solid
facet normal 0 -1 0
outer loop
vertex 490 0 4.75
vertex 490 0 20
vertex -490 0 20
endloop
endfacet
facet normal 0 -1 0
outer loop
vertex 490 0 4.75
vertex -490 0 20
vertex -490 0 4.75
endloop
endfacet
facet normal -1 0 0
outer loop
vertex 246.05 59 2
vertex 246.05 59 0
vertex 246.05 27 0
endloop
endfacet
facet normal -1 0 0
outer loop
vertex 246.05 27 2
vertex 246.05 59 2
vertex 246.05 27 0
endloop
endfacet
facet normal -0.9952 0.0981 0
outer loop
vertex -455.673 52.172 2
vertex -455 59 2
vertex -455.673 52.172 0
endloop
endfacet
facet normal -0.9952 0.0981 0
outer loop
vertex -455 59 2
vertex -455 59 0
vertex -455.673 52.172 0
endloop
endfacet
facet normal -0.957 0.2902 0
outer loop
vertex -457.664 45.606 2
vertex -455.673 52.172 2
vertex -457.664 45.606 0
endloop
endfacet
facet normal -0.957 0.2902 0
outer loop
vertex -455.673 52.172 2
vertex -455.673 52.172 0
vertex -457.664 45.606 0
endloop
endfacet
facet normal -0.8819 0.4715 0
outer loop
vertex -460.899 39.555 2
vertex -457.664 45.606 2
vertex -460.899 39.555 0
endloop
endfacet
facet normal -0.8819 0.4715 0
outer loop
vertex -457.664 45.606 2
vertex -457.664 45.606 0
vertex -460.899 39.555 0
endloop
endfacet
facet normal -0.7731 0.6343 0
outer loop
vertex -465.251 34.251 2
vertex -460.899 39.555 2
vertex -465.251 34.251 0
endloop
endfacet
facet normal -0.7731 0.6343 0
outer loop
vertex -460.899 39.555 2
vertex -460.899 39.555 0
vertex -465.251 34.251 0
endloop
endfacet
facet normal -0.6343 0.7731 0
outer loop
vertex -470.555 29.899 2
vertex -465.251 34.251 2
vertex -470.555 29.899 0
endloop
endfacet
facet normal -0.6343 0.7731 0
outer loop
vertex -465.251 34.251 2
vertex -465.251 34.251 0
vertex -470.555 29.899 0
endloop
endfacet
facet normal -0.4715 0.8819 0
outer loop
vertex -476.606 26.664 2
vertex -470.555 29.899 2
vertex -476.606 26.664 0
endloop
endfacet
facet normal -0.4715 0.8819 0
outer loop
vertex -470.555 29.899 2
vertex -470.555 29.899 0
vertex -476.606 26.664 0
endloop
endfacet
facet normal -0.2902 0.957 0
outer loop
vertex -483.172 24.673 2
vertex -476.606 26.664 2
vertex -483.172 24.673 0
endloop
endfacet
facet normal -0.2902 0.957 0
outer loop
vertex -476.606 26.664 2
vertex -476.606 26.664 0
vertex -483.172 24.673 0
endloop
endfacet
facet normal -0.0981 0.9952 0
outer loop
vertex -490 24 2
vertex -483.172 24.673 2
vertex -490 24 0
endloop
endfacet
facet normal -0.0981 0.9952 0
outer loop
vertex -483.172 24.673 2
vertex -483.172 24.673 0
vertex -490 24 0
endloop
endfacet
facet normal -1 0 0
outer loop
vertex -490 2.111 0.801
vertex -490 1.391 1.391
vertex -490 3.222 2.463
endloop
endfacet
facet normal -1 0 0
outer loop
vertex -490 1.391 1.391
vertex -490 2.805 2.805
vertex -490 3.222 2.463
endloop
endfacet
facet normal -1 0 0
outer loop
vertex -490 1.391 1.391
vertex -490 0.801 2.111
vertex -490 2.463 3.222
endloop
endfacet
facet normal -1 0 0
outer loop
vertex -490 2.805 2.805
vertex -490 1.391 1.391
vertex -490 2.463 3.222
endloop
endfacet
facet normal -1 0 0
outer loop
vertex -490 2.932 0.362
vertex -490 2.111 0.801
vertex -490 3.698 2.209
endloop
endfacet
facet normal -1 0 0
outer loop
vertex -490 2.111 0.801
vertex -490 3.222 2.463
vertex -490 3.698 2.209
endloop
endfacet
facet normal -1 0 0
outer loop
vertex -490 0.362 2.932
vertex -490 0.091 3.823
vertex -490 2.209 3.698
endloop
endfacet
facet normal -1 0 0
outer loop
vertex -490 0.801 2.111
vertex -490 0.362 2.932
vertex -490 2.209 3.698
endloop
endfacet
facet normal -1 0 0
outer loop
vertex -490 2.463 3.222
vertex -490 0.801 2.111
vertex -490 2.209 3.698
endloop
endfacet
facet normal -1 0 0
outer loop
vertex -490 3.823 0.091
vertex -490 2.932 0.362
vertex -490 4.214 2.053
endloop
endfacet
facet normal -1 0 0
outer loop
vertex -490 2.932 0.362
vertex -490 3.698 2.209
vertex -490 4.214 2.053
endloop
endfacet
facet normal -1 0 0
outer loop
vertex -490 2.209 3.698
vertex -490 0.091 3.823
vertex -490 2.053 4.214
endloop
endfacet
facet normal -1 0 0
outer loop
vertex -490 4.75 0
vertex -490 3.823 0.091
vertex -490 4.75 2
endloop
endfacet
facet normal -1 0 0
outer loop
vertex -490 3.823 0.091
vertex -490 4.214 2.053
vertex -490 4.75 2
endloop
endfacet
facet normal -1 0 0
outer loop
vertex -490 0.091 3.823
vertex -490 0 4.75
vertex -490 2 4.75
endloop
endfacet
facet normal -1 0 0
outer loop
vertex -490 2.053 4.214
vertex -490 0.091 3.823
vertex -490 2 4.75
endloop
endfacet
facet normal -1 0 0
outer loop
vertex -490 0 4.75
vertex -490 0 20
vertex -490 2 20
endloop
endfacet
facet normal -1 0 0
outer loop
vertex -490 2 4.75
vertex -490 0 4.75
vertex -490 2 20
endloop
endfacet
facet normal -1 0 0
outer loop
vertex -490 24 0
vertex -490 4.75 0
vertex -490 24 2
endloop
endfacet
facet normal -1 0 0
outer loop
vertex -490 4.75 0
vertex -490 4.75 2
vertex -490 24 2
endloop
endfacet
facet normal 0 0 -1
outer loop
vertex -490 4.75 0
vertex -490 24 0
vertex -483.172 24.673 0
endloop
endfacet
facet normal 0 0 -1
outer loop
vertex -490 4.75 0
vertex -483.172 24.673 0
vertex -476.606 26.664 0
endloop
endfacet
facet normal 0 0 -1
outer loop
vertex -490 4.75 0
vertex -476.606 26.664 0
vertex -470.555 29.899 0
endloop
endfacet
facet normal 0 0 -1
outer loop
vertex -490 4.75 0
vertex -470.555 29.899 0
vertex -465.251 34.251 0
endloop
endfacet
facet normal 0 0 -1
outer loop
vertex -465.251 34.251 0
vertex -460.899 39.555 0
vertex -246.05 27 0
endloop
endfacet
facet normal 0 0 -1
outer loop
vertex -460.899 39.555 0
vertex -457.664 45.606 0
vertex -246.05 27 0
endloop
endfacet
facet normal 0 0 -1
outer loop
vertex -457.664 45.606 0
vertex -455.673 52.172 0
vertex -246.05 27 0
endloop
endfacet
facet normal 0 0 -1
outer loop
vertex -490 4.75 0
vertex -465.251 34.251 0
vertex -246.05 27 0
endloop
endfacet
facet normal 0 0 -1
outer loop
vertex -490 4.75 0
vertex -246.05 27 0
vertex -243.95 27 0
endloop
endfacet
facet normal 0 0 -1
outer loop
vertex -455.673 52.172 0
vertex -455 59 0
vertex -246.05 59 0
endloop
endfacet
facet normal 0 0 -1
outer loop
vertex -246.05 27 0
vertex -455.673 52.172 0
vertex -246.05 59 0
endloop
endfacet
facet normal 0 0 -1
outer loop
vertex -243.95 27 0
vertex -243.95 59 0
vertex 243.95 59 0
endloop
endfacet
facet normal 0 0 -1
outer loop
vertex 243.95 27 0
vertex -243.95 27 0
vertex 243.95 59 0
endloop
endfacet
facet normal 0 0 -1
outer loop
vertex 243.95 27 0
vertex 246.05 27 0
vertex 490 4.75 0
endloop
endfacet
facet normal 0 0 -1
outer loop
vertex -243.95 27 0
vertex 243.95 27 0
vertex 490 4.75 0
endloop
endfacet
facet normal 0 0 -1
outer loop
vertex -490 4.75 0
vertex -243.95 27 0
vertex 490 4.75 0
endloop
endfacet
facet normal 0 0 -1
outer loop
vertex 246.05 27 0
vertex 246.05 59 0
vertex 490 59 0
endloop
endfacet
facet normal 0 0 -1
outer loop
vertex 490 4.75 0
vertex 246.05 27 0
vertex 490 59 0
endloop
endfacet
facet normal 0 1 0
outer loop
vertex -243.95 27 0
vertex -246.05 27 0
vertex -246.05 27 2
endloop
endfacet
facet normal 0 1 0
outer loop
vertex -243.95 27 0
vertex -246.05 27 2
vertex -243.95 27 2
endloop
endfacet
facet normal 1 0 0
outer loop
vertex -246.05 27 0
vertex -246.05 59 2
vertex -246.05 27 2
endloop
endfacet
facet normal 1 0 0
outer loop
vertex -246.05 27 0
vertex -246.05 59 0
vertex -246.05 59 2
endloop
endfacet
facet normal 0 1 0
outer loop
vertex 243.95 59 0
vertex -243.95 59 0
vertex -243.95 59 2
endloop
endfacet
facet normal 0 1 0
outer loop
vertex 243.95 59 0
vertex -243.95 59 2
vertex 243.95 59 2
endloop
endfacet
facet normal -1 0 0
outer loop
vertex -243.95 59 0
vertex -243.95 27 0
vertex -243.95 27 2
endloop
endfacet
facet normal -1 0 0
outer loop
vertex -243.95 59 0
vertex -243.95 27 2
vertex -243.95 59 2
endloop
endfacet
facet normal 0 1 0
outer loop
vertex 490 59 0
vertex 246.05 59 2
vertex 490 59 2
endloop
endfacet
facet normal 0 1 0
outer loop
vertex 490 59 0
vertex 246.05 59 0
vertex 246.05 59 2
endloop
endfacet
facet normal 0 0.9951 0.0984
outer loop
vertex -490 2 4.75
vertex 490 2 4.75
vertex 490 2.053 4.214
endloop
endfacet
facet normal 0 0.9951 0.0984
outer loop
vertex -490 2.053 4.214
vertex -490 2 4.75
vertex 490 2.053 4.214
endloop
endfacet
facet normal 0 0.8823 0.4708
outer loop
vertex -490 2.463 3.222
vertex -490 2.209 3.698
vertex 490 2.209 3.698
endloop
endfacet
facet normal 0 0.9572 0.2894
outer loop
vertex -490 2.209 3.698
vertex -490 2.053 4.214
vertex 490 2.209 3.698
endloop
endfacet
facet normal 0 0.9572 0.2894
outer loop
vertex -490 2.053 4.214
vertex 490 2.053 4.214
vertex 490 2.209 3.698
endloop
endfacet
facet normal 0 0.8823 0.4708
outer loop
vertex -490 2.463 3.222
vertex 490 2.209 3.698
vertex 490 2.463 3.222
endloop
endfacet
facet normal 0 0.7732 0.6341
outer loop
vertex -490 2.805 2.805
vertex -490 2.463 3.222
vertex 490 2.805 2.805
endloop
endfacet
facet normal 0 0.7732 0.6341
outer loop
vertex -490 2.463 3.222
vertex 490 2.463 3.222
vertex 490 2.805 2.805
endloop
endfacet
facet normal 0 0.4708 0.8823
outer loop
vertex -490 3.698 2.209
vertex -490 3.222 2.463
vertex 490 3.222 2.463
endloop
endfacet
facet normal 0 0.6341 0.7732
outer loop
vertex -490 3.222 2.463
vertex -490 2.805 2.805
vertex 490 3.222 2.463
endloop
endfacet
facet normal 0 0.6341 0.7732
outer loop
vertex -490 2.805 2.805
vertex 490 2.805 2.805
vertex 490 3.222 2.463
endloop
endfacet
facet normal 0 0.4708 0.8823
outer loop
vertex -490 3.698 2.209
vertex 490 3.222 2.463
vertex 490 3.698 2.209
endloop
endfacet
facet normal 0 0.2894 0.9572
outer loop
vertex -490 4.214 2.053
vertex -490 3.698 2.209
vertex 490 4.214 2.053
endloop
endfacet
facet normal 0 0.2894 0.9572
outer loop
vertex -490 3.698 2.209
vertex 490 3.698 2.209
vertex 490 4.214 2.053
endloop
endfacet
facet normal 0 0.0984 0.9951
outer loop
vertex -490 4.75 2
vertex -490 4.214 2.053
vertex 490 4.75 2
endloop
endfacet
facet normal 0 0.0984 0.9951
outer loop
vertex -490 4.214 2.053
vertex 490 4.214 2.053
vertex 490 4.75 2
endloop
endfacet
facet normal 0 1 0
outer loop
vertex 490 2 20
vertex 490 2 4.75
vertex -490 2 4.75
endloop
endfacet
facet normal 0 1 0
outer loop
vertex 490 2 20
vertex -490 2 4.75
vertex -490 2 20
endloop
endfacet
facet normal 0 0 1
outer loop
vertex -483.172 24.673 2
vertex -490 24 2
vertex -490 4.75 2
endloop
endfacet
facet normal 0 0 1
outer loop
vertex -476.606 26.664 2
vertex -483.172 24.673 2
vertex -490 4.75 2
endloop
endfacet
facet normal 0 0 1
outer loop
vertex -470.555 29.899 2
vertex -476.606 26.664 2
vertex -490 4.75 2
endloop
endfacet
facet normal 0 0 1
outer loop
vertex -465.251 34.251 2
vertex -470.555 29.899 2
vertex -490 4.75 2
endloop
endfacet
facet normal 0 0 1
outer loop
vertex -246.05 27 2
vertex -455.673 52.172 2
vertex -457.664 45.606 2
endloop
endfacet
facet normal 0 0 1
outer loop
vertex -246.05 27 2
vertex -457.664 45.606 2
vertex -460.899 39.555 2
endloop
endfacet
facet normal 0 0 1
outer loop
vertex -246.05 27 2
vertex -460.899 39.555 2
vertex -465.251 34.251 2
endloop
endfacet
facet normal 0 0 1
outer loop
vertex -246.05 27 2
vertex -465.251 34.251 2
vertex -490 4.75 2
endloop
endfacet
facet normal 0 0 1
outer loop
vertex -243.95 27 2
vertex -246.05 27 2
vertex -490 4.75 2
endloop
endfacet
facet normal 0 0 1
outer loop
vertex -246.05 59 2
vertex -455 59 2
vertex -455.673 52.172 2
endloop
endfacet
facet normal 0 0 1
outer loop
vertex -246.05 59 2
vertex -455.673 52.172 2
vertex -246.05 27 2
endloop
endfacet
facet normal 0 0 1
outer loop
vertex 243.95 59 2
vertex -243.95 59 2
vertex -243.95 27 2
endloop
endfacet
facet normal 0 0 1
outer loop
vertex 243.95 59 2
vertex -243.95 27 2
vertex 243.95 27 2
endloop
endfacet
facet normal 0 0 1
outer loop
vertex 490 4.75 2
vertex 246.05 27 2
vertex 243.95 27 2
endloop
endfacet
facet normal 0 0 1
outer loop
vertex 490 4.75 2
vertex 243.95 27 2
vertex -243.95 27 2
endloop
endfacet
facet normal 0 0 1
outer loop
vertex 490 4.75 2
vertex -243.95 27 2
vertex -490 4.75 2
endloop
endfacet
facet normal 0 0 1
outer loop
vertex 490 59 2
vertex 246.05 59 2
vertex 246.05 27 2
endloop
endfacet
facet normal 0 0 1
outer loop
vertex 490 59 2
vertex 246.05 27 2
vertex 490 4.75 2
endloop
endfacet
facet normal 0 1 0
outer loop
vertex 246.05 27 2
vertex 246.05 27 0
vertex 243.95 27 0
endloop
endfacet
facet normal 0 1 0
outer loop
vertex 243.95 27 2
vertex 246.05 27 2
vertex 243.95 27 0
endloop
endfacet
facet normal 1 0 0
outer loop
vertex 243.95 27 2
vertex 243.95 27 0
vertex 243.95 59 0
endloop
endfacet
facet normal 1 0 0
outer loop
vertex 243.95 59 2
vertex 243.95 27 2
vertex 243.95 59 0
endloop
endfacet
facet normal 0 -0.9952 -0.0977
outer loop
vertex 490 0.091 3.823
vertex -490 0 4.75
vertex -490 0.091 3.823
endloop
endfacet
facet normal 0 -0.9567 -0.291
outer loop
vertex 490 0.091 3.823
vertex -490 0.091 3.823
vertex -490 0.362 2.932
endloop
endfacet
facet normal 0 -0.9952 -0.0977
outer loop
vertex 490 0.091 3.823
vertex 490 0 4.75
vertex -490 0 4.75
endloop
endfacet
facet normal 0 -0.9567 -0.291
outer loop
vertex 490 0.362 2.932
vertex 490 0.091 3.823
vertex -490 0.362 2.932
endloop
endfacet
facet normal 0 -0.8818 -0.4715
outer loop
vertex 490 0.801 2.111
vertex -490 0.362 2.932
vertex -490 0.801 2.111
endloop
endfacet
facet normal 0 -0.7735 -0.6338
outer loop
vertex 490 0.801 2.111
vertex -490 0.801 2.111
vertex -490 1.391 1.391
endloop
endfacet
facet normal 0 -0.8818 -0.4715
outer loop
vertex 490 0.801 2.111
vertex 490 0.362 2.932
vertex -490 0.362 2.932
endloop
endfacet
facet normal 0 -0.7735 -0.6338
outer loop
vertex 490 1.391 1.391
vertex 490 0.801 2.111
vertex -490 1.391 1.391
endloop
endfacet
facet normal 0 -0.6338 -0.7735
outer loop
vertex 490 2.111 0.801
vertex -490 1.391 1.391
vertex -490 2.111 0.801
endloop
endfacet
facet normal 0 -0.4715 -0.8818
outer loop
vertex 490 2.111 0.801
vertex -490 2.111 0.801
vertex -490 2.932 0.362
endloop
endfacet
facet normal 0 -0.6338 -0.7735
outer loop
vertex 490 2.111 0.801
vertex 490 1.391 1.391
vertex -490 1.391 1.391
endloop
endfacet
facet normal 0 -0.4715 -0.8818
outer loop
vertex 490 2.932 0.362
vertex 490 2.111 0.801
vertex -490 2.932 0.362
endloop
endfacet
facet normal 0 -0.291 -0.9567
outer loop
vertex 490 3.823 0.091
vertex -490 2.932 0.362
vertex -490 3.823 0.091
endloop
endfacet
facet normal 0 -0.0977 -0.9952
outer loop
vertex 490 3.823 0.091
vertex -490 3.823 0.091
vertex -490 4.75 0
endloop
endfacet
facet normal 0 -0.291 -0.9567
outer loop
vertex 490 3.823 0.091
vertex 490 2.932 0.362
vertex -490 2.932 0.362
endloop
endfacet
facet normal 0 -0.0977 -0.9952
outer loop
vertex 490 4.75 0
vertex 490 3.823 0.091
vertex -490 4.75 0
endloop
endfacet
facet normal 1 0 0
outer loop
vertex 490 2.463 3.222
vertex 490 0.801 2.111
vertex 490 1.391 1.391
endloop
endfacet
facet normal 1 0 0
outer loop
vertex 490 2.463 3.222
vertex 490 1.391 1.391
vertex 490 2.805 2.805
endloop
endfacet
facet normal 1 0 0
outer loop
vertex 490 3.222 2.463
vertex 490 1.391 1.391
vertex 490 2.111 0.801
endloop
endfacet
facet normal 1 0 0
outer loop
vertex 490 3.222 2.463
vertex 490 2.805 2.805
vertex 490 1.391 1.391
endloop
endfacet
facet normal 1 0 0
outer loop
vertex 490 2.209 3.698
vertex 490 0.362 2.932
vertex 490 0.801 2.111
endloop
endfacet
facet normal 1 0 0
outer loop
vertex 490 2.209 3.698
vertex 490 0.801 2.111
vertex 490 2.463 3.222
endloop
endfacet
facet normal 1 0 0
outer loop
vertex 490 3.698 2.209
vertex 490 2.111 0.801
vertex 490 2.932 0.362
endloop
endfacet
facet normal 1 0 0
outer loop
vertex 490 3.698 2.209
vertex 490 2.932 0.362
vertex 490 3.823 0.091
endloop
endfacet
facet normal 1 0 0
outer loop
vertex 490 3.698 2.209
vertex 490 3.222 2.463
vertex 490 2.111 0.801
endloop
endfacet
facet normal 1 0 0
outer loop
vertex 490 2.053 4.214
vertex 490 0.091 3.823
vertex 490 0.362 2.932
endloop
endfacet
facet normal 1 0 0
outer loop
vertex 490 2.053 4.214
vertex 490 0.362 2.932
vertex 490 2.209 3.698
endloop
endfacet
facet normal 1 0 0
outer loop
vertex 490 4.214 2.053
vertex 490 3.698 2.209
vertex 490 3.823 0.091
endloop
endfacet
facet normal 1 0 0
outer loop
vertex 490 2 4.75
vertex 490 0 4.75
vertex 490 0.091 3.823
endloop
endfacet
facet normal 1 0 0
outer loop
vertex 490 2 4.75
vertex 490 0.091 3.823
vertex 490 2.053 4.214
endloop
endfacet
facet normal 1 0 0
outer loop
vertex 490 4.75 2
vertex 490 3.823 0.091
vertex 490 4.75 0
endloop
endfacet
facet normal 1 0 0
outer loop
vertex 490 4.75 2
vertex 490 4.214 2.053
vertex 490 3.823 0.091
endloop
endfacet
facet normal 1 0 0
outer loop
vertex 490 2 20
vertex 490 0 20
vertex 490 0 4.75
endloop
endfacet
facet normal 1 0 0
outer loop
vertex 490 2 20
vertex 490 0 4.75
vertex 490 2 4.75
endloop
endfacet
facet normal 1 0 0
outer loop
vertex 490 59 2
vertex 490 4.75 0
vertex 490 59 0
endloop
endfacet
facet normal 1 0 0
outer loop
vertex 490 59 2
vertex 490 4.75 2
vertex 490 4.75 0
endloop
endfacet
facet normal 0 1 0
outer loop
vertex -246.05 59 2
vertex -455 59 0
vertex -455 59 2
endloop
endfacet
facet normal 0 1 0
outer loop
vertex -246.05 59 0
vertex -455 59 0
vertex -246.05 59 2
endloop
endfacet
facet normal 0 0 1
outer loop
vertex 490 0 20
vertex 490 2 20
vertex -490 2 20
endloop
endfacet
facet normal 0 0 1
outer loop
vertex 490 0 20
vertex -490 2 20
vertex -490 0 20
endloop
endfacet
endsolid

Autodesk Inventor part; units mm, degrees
ref_plane "YZ Plane" through (0, 0, 0) normal (1, 0, 0) x (0, 1, 0)
ref_plane "XZ Plane" through (0, 0, 0) normal (0, 1, 0) x (-1, 0, 0)
ref_plane "XY Plane" through (0, 0, 0) normal (0, 0, 1) x (1, 0, 0)
sketch "Sketch1" plane through (0, 0, 0) normal (0, 0, 1) x (1, 0, 0)
  line L0 (-490, 59) -> (490, 59)
  line L1 (490, 59) -> (490, 0)
  line L2 (490, 0) -> (-490, 0)
  line L3 (-490, 0) -> (-490, 59)
  point P0 (0, 0)
  point P1 (0, 0)
  dimension "d0" = 980
  dimension "d1" = 59
extrude "Plate1" add sketch "Sketch1" along normal blind 2
sketch "Sketch2" plane through (490, 2, 0) normal (0, -1, 0) x (1, 0, 0)
  line L0 (-980, 0) -> (0, 0)
  line L1 (0, 0) -> (0, 20)
  line L2 (0, 20) -> (-980, 20)
  line L3 (-980, 20) -> (-980, 0)
edge flange "Flange1" height 20 angle 90 thickness 2 bend radius 2.75 thickness toward (0, -1, 0) relief round relief width 2 relief depth 1 edges at (0, 0, 2) wall of the first edge with corners at (-490, 2, 0) (490, 2, 0) (490, 2, 20) (-490, 2, 20)
bend "Bend1"
corner "Corner1"
sketch "Sketch5" plane through (0, 0, 0) normal (0, 0, -1) x (-1, 0, 0)
  line L0 (490, 59) -> (-490, 59) projected
  line L1 (490, 0) -> (-490, 0) projected
  circle A0 centre (0, 59) radius 35
  line L2 (243.95, 59) -> (246.05, 59)
  line L3 (246.05, 59) -> (246.05, 27)
  line L4 (246.05, 27) -> (243.95, 27)
  line L5 (243.95, 27) -> (243.95, 59)
  line L6 (-243.95, 59) -> (-246.05, 59)
  line L7 (-246.05, 59) -> (-246.05, 27)
  line L8 (-246.05, 27) -> (-243.95, 27)
  line L9 (-243.95, 27) -> (-243.95, 59)
  line L10 (0, 59) -> (0, 0) construction
  circle A1 centre (-490, 59) radius 35
  circle A2 centre (490, 59) radius 35
  point P0 (0, 0)
  point P1 (245, 27)
  point P2 (-245, 27)
  point P3 (246.05, 59)
  point P4 (-35, 59)
  point P5 (35, 59)
  point P6 (-246.05, 59)
  dimension "d45" = 70
  dimension "d48" = 2.1
  dimension "d49" = 490
  dimension "d51" = 27
  dimension "d52" = 32
extrude "Extrusion1" cut sketch "Sketch5" against normal through all contours L3 L4 L5 L0 | L9 L8 L7 L0 | A2
sketch "Sketch9" plane through (0, 0, 2) normal (0, 0, 1) x (1, 0, 0)
  line L0 (485.6141, 29.596) -> (485.6141, 17.596) construction
  line L1 (485.6141, 17.596) -> (285.6141, 17.596) construction
  line L2 (285.6141, 17.596) -> (285.6141, 29.596) construction
  line L3 (285.6141, 29.596) -> (485.6141, 29.596) construction
  line L4 (-490, 59) -> (490, 59) projected
  point P0 (0, 0)
  point P1 (1.05, 68)
  point P2 (490, 59)
  dimension "d40" = 200
  dimension "d41" = 12
mark "Mark2"
equation "\"d2\" = Thickness"
equation "\"d3\" = BendReliefWidth"
equation "\"d4\" = BendReliefDepth"
equation "\"d5\" = MinimumRemnant"
equation "\"d6\" = TransitionRadius"
equation "\"d9\" = BendRadius"
equation "\"d10\" = CornerReliefSize"
equation "\"d11\" = GapSize"
equation "\"d12\" = JacobiRadiusSize"
equation "\"BendReliefWidth\" = Thickness"
equation "\"BendReliefDepth\" = 0.5 * Thickness"
equation "\"CornerReliefSize\" = 4 * Thickness"
equation "\"MinimumRemnant\" = 2 * Thickness"
equation "\"TransitionRadius\" = BendRadius"
equation "\"JacobiRadiusSize\" = BendRadius"
equation "\"GapSize\" = Thickness"
equation "\"Thickness\" = 2"
equation "\"BendRadius\" = 2.75"
properties part number "MSC 323 STRINGER BOARD  #" material "Stainless Steel"
